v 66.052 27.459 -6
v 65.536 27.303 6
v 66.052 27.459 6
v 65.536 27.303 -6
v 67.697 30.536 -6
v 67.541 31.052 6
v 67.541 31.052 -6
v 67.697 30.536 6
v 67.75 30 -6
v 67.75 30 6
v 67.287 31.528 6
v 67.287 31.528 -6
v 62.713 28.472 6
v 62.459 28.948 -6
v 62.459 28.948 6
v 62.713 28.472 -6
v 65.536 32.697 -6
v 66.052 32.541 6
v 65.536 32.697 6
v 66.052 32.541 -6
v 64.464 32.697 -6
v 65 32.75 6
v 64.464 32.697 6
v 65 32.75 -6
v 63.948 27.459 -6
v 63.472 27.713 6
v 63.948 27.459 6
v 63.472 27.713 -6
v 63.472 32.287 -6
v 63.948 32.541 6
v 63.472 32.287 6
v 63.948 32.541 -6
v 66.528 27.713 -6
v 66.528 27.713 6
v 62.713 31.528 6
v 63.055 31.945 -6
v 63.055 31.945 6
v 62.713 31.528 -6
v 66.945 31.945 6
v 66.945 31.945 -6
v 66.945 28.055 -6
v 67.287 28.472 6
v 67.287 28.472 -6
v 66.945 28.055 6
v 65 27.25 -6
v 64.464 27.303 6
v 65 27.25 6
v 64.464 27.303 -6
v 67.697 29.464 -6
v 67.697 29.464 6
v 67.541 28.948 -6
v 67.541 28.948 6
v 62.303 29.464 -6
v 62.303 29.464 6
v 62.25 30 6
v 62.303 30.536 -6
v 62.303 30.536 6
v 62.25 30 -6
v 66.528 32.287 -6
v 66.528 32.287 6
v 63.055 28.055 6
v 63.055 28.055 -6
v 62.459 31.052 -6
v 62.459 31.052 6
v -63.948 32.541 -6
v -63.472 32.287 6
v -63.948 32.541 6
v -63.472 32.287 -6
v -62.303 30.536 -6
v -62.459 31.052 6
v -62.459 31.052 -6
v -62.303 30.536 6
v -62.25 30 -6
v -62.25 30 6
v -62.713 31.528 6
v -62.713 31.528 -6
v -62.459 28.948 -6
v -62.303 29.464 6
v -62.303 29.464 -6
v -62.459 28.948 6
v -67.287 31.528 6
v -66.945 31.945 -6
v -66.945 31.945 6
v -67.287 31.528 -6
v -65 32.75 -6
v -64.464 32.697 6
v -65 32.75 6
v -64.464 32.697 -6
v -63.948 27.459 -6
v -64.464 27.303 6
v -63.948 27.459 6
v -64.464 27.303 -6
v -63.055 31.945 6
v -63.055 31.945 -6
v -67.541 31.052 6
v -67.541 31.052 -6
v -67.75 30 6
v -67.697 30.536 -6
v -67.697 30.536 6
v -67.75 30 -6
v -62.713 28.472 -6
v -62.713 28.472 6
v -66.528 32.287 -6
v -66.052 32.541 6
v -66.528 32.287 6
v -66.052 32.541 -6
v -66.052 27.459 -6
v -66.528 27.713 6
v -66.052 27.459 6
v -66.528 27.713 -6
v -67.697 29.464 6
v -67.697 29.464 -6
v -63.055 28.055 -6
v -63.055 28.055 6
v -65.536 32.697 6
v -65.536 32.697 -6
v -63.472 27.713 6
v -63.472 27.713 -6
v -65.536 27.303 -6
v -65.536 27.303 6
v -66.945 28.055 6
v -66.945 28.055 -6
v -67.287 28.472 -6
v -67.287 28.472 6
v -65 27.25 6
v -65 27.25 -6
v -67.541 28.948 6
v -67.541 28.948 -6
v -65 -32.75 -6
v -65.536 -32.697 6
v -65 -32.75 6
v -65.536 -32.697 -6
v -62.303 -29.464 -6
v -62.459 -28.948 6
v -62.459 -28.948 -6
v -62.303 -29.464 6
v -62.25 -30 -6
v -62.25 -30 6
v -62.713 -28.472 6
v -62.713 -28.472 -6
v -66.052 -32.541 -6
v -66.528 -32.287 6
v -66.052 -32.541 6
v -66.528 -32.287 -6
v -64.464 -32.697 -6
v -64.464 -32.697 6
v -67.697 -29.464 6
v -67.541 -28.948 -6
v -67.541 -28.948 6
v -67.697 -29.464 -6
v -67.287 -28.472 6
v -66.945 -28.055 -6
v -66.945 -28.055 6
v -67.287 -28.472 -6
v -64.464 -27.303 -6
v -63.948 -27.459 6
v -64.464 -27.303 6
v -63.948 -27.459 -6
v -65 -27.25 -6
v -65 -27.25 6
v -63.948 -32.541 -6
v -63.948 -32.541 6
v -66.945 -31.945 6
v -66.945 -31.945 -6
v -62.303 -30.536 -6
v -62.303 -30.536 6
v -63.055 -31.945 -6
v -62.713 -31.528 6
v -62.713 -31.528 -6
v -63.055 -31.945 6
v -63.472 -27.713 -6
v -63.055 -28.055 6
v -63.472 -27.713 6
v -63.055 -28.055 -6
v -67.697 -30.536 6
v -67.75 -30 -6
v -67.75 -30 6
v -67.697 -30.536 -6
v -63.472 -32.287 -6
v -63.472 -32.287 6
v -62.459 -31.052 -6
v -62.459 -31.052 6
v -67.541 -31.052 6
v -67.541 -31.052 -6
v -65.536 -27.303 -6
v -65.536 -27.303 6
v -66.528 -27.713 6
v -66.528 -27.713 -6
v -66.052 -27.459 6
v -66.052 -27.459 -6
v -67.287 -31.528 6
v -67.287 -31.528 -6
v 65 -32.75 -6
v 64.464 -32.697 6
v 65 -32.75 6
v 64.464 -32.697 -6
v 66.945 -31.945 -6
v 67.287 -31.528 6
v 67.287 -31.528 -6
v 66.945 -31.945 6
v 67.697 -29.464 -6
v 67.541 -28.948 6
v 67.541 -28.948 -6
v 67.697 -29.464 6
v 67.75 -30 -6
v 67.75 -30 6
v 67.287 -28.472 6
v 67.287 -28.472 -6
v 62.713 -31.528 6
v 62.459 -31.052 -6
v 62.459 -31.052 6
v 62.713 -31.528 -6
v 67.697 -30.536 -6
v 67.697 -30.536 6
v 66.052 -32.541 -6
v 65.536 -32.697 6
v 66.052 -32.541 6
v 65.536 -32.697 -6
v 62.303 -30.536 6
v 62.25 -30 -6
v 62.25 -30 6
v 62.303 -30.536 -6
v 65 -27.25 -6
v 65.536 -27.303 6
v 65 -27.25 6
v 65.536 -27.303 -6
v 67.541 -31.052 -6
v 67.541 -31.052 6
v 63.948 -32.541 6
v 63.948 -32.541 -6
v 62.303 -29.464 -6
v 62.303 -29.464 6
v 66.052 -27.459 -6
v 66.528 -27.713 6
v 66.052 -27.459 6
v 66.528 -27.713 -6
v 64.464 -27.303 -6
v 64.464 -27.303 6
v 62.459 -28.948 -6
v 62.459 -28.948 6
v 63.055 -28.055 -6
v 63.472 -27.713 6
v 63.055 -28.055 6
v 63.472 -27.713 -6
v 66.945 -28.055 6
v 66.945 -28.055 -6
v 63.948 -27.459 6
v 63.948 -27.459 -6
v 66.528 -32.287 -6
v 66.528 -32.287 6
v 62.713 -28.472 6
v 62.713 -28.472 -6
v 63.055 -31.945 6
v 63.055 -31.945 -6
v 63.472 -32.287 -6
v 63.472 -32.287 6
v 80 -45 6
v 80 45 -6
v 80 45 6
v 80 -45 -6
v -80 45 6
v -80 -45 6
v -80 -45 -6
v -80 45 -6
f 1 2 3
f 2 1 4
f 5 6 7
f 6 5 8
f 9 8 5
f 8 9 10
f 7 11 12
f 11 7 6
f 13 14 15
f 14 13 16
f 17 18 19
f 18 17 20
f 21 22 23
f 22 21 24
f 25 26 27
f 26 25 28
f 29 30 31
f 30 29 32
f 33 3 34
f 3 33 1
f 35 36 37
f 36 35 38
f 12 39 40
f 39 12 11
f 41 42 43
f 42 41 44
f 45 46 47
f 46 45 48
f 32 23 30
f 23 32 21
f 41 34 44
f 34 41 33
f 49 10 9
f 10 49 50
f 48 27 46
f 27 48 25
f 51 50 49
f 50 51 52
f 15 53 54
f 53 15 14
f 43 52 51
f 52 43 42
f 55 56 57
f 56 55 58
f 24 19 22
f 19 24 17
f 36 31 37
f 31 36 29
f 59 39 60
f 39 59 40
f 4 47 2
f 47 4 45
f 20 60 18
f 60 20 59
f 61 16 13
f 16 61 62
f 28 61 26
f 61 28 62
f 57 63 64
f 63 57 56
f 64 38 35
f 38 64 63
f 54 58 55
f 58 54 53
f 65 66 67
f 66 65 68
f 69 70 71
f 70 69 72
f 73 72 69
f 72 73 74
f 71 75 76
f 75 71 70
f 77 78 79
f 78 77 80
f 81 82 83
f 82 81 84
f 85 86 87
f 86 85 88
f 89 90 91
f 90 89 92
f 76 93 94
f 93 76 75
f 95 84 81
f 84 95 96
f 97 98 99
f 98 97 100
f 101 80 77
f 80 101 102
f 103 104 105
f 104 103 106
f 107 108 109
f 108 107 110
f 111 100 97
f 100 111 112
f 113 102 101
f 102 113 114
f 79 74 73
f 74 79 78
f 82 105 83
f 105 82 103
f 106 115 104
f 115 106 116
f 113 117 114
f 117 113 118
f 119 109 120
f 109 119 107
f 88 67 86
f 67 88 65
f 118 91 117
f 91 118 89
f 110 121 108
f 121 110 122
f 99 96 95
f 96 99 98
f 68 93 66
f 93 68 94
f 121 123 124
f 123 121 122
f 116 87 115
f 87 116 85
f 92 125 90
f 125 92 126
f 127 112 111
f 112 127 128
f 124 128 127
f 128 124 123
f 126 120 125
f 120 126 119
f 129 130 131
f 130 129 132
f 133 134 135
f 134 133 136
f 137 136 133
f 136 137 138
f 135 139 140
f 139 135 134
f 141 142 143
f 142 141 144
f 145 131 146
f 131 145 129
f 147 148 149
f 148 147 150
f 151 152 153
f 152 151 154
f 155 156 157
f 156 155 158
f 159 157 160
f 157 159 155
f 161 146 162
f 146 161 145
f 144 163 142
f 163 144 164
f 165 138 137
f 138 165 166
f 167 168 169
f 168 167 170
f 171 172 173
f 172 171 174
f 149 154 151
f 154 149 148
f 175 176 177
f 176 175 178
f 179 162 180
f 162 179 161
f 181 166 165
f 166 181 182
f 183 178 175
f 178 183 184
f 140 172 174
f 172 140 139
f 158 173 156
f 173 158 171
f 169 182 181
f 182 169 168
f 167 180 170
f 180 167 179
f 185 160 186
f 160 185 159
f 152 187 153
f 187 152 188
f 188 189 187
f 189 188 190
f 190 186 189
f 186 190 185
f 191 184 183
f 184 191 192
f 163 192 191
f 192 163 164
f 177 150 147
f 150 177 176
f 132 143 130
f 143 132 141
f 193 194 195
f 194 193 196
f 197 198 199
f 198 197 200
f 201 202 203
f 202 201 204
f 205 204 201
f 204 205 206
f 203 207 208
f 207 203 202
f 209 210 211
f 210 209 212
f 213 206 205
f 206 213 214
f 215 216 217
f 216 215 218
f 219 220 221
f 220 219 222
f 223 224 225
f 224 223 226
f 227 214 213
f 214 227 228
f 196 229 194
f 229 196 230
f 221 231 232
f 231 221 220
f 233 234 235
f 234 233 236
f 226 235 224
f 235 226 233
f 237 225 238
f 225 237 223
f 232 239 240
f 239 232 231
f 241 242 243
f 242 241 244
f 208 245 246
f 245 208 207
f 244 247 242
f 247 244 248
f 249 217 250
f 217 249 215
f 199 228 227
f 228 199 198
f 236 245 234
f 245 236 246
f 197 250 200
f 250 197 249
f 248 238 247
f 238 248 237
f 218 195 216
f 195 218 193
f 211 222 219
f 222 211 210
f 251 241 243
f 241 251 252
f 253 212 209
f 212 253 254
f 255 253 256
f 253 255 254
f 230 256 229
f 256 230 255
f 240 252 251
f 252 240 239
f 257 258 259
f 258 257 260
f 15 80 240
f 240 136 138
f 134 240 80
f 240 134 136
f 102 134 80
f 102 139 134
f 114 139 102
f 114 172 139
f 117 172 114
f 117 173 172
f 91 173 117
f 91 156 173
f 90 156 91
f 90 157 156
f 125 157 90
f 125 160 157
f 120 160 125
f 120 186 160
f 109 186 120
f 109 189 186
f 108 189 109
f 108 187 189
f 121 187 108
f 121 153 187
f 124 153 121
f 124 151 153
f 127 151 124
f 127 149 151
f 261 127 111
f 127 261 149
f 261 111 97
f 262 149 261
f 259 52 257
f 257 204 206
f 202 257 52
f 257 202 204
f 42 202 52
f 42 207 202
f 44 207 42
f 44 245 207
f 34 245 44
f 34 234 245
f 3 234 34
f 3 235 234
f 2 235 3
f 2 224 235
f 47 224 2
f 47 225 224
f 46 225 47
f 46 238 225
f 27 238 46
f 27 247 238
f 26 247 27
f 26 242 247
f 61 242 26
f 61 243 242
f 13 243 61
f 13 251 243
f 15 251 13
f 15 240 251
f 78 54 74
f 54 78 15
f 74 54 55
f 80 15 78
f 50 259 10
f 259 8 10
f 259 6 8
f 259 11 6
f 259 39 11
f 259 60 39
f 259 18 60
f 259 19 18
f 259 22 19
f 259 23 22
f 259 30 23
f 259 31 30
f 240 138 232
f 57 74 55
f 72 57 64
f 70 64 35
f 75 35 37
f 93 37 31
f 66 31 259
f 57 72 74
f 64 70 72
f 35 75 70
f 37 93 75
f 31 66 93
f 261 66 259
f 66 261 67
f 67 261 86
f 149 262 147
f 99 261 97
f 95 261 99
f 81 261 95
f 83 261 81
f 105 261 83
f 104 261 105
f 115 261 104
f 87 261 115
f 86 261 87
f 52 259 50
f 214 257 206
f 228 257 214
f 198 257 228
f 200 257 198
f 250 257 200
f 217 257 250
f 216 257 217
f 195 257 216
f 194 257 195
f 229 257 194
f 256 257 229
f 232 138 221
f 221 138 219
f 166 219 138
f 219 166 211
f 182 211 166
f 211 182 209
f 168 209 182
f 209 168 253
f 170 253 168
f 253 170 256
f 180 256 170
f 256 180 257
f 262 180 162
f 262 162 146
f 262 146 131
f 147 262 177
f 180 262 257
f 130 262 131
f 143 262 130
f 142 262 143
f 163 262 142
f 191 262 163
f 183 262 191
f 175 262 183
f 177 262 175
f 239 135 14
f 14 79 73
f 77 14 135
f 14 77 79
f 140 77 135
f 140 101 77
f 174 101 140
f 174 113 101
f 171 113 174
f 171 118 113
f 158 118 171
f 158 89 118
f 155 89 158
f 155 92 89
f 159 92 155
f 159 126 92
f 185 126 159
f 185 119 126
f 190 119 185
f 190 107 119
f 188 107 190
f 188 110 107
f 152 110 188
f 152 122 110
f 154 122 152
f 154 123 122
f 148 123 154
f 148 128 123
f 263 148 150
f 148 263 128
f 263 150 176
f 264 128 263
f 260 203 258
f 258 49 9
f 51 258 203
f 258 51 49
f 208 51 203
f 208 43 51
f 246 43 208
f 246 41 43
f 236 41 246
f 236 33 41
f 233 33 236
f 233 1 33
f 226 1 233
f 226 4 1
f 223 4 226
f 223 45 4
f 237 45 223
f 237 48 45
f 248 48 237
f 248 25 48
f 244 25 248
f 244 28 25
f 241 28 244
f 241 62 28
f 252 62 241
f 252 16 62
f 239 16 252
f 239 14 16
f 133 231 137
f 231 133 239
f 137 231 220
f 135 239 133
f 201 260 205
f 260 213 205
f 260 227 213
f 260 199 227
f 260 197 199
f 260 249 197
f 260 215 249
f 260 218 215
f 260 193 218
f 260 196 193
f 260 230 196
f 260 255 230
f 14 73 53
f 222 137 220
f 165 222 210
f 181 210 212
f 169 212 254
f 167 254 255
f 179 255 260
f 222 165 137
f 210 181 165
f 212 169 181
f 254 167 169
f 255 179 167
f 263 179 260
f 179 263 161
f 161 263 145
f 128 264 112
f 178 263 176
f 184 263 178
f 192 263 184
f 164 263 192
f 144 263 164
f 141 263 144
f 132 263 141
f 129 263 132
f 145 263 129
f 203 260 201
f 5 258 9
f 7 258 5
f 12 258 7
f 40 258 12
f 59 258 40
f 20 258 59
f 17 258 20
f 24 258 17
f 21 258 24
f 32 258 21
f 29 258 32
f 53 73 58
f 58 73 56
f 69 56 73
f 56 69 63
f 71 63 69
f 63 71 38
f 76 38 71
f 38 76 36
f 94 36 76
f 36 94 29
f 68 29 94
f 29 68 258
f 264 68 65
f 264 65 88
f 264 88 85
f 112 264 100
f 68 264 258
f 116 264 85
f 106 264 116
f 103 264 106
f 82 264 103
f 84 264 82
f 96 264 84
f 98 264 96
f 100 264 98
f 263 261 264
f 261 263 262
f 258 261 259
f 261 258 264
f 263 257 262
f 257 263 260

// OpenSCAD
$fn = 32;

// ----------------------------------------------------------------------
// Corner plate 160 x 90 x 12
// 4 holes, centres taken from the edge offset
// ----------------------------------------------------------------------

// --- parameters (mm) ---
plate = [160, 90, 12];  // overall size (x, y, z)
holes = 4;              // number of holes the drawing asks for
hole_d = 5.5;           // hole diameter
edge = 15;              // hole centre offset from the plate edge

// --- derived feature positions (mm) ---
corner_x = plate[0] / 2 - edge;  // = 65   corner hole X
corner_y = plate[1] / 2 - edge;  // = 30   corner hole Y
feature_centers = [
  [corner_x, corner_y],
  [-corner_x, corner_y],
  [-corner_x, -corner_y],
  [corner_x, -corner_y]
];   // hole centres the loop below drills

// plate outline, every hole drilled through with the same cutters
difference() {
  cube(plate, center = true);
  for (centre = feature_centers)
    translate([centre[0], centre[1], 0])
      cylinder(d = hole_d, h = plate[2] + 2, center = true);
}
